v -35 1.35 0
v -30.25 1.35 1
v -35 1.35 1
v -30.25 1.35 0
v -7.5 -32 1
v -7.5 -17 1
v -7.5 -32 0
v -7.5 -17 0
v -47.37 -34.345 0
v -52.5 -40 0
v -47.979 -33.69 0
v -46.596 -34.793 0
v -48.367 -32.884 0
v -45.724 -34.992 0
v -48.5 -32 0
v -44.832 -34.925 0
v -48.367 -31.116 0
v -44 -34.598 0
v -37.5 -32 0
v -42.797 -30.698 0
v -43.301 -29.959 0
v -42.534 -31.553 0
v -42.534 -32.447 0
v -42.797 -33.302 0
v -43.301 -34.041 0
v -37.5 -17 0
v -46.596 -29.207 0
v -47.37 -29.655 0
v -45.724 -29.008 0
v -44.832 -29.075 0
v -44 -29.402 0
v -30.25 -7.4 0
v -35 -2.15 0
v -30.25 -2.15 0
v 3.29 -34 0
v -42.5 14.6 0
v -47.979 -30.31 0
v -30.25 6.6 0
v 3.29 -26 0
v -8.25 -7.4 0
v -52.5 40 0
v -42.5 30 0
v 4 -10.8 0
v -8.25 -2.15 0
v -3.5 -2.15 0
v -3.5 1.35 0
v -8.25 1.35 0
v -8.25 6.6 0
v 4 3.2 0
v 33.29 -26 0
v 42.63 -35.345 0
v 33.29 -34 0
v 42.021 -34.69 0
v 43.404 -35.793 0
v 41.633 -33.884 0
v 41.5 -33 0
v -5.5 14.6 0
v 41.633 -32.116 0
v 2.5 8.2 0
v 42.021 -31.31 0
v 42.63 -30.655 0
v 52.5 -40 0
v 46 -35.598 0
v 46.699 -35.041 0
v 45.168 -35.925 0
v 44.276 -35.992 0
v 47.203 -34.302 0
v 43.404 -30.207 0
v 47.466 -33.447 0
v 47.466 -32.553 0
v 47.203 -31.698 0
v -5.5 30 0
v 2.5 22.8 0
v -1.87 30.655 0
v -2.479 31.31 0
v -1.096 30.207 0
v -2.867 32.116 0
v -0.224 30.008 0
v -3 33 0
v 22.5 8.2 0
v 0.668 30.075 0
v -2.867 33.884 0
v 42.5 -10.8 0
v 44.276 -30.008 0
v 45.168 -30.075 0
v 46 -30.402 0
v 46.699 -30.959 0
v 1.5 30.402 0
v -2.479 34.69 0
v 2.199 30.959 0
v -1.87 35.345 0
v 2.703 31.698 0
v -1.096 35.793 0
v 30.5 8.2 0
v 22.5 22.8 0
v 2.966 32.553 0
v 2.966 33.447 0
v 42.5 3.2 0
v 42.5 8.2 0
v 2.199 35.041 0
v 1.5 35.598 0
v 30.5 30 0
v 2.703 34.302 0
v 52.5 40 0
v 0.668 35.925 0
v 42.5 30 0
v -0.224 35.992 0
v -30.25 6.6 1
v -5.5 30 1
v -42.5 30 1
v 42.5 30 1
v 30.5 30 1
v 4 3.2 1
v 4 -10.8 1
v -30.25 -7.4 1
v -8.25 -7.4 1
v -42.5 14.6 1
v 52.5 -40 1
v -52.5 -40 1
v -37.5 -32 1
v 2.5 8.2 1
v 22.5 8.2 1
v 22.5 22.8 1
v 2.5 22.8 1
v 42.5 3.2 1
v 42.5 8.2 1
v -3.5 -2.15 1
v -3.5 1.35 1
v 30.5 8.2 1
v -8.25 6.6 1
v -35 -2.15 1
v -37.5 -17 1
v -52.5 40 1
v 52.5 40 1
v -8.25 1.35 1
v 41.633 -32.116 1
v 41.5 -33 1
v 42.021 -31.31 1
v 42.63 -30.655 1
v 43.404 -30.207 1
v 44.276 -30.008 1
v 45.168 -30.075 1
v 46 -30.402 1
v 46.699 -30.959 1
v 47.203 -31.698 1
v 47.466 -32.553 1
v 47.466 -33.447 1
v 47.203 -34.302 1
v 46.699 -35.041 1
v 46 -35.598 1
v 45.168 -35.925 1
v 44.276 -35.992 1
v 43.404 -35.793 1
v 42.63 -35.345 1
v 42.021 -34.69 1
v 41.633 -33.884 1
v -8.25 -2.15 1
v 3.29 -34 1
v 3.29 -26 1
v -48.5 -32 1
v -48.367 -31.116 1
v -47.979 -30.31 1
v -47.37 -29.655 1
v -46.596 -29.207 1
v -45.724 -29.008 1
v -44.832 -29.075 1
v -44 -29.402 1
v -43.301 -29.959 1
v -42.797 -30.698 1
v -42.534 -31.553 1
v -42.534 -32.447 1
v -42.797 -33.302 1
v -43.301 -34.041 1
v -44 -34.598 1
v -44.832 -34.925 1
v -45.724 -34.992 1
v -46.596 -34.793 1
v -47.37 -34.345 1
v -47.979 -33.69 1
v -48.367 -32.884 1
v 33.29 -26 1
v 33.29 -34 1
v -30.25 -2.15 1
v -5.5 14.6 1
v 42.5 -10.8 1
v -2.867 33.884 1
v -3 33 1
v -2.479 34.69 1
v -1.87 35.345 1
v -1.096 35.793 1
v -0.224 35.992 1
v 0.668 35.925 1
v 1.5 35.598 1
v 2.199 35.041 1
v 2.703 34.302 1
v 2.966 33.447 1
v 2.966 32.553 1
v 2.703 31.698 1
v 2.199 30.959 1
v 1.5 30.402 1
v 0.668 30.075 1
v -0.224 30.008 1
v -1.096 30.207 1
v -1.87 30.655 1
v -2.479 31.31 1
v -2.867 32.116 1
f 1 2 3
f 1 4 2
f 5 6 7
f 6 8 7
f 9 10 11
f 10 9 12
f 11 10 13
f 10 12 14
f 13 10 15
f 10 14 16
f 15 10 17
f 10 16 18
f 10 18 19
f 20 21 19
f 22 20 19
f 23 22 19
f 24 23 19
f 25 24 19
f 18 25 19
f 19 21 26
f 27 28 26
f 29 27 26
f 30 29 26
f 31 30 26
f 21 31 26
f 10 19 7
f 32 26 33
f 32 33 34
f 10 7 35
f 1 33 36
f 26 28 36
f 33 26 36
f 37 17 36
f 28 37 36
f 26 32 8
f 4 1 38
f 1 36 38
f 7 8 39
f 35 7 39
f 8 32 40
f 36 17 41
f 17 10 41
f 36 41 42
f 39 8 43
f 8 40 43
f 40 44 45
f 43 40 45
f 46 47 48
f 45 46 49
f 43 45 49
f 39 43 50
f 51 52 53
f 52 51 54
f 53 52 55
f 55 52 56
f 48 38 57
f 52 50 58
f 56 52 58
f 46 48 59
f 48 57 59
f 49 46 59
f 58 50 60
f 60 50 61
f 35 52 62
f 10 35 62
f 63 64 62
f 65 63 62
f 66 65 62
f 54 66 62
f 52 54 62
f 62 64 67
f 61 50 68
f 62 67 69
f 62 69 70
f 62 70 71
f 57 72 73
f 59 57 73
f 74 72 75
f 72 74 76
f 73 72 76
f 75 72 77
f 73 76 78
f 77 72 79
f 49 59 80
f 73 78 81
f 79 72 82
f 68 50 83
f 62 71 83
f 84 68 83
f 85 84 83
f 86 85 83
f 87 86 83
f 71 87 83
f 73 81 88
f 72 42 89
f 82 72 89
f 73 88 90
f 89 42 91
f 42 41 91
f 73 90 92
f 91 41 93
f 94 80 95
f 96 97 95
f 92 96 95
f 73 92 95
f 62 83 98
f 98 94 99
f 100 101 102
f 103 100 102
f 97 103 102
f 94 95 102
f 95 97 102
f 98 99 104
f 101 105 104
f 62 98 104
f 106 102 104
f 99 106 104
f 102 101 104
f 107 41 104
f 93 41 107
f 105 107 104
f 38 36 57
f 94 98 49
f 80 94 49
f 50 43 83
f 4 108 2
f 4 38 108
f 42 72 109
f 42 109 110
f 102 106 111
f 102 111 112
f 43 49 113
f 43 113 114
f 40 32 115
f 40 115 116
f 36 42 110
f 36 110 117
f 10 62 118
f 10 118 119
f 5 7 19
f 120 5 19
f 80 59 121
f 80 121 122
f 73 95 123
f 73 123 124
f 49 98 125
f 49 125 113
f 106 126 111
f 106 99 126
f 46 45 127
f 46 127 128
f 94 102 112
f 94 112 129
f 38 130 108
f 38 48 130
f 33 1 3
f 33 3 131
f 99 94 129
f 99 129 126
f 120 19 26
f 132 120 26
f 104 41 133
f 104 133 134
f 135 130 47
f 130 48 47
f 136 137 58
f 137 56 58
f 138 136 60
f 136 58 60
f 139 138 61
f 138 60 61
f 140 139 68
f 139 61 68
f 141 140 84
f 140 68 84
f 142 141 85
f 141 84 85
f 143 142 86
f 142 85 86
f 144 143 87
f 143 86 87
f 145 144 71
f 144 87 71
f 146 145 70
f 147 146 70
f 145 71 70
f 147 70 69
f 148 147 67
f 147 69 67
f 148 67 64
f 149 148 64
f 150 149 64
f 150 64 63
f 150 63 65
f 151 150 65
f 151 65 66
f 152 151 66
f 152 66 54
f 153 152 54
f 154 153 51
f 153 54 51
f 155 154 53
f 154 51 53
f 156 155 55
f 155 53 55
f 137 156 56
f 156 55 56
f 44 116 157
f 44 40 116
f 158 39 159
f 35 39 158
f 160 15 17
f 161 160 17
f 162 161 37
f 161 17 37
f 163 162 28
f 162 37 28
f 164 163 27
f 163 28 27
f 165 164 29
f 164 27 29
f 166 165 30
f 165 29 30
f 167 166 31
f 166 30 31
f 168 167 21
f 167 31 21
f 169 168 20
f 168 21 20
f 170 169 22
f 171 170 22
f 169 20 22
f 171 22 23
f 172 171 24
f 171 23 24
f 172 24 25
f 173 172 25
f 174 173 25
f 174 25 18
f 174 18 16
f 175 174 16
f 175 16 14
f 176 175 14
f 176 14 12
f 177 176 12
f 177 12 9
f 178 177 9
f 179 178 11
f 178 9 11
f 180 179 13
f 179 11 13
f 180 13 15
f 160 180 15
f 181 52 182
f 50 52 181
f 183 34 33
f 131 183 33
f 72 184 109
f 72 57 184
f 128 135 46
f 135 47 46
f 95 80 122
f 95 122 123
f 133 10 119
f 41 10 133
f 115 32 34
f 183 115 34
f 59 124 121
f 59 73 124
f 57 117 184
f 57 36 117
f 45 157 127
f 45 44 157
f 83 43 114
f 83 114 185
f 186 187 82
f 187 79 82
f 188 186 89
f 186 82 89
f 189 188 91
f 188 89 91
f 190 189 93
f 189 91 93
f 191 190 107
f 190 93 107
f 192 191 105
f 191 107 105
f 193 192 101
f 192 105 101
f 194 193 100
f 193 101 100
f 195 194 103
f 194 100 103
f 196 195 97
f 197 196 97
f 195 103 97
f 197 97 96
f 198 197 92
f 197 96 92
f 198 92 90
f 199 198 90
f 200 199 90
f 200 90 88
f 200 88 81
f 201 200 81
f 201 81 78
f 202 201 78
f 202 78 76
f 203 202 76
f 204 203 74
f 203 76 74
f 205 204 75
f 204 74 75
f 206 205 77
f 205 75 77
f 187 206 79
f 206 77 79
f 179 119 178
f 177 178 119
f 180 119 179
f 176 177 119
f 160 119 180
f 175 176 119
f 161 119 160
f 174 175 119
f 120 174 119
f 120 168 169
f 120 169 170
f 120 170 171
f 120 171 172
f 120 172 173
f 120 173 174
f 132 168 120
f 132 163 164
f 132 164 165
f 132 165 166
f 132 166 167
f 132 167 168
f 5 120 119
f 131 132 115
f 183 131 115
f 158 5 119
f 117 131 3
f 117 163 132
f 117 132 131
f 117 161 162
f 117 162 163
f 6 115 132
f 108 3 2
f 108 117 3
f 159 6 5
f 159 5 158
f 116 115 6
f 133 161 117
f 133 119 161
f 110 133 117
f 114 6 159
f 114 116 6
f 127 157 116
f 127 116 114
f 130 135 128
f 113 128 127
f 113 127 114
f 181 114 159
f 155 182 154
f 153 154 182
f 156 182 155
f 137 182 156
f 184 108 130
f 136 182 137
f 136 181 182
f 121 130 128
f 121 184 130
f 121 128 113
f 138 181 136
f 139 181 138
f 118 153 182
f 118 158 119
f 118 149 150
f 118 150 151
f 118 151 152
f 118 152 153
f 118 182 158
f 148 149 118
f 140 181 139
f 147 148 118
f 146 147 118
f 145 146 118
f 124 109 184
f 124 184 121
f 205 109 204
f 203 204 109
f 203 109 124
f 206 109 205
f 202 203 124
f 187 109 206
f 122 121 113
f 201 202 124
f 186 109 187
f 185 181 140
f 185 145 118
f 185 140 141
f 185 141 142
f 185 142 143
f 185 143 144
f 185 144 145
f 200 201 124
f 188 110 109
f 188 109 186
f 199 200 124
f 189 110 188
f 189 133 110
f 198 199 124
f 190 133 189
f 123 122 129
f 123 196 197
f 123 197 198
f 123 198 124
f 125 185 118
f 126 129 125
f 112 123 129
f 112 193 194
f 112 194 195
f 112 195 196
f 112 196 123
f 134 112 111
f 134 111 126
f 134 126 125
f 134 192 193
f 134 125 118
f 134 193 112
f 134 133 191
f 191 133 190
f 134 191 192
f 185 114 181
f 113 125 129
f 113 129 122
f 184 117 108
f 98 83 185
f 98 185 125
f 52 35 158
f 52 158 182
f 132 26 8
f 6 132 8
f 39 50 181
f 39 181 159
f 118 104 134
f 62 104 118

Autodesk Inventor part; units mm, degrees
ref_plane "YZ Plane" through (0, 0, 0) normal (1, 0, 0) x (0, 1, 0)
ref_plane "XZ Plane" through (0, 0, 0) normal (0, 1, 0) x (-1, 0, 0)
ref_plane "XY Plane" through (0, 0, 0) normal (0, 0, 1) x (1, 0, 0)
sketch "Sketch1" plane through (0, 0, 0) normal (0, 0, 1) x (1, 0, 0)
  line L0 (-52.5, 40) -> (52.5, 40)
  line L1 (52.5, 40) -> (52.5, -40)
  line L2 (52.5, -40) -> (-52.5, -40)
  line L3 (-52.5, -40) -> (-52.5, 40)
  line L4 (-52.5, 40) -> (52.5, -40) construction
  line L5 (52.5, 40) -> (-52.5, -40) construction
  point P0 (0, 0)
  dimension "d0" = 80
  dimension "d1" = 105
extrude "Plate1" add sketch "Sketch1" along normal blind 1
sketch "Sketch3" plane through (0, 0, 0) normal (0, 0, -1) x (-1, 0, 0)
  line L0 (-42.5, 3.2) -> (-4, 3.2)
  line L1 (-4, 3.2) -> (-4, -10.8)
  line L2 (-4, -10.8) -> (-42.5, -10.8)
  line L3 (-42.5, -10.8) -> (-42.5, 3.2)
  line L4 (-42.5, 3.2) -> (-4, -10.8) construction
  line L5 (-4, 3.2) -> (-42.5, -10.8) construction
  line L6 (8.25, 6.6) -> (30.25, 6.6)
  line L7 (35, 1.35) -> (35, -2.15)
  line L8 (30.25, -7.4) -> (8.25, -7.4)
  line L9 (3.5, -2.15) -> (3.5, 1.35)
  line L10 (0.2073, 10) -> (38.2927, -10.8) construction
  line L11 (35, 6.6) -> (3.5, -7.4) construction
  line L12 (-2.5, 8.2) -> (-22.5, 8.2)
  line L13 (-22.5, 8.2) -> (-22.5, 22.8)
  line L14 (-22.5, 22.8) -> (-2.5, 22.8)
  line L15 (-2.5, 22.8) -> (-2.5, 8.2)
  line L16 (-2.5, 8.2) -> (-22.5, 22.8) construction
  line L17 (-22.5, 8.2) -> (-2.5, 22.8) construction
  line L18 (-3.29, -34) -> (-33.29, -34)
  line L19 (-33.29, -34) -> (-33.29, -26)
  line L20 (-33.29, -26) -> (-3.29, -26)
  line L21 (-3.29, -26) -> (-3.29, -34)
  line L22 (-3.29, -34) -> (-33.29, -26) construction
  line L23 (-33.29, -34) -> (-3.29, -26) construction
  line L24 (52.5, 40) -> (-52.5, 40) projected
  line L25 (52.5, -40) -> (52.5, 40) projected
  line L26 (30.25, -7.4) -> (30.25, -2.15)
  line L27 (30.25, -2.15) -> (35, -2.15)
  line L28 (30.25, 6.6) -> (30.25, 1.35)
  line L29 (30.25, 1.35) -> (35, 1.35)
  line L30 (8.25, -7.4) -> (8.25, -2.15)
  line L31 (8.25, -2.15) -> (3.5, -2.15)
  line L32 (8.25, 6.6) -> (8.25, 1.35)
  line L33 (8.25, 1.35) -> (3.5, 1.35)
  line L34 (-52.5, 40) -> (-52.5, -40) projected
  line L35 (-42.5, 30) -> (-30.5, 30)
  line L36 (-30.5, 30) -> (-30.5, 8.2)
  line L37 (-30.5, 8.2) -> (-42.5, 8.2)
  line L38 (-42.5, 8.2) -> (-42.5, 30)
  line L39 (7.5, -32) -> (37.5, -32)
  line L40 (37.5, -32) -> (37.5, -17)
  line L41 (37.5, -17) -> (7.5, -17)
  line L42 (7.5, -17) -> (7.5, -32)
  line L43 (-52.5, -40) -> (52.5, -40) projected
  point P0 (0, 0)
  point P1 (-23.25, -3.8)
  point P2 (19.25, -0.4)
  point P3 (-12.5, 15.5)
  point P4 (-18.29, -30)
  dimension "d14" = 14
  dimension "d17" = 7.5
  dimension "d22" = 20
  dimension "d24" = 14.6
  dimension "d37" = 8
  dimension "d40" = 30
  dimension "d46" = 17.2
  dimension "d47" = 55
  dimension "d48" = 17.5
  dimension "d49" = 33.4
  dimension "d50" = 66
  dimension "d65" = 14
  dimension "d66" = 31.5
  dimension "d67" = 3.5
  dimension "d68" = 22
  dimension "d69" = 5
  dimension "d70" = 10
  dimension "d71" = 10
  dimension "d72" = 10
  dimension "d73" = 8
  dimension "d74" = 5
  dimension "d75" = 19.21
  dimension "d76" = 15
  dimension "d77" = 8
  dimension "d78" = 15
  dimension "d79" = 30
extrude "Extrusion1" cut sketch "Sketch3" against normal blind 10 contours L0 L1 L2 L3 | L6 L28 L29 L7 L27 L26 L8 L30 L31 L9 L33 L32 | L12 L13 L14 L15 | L18 L19 L20 L21 | L35 L36 L37 L38 | L42 L41 L40 L39
sketch "Sketch5" plane through (0, 0, 0) normal (0, 0, -1) x (-1, 0, 0)
  line L0 (42.5, 14.6) -> (5.5, 14.6)
  line L1 (5.5, 14.6) -> (5.5, 30)
  line L2 (5.5, 30) -> (42.5, 30)
  line L3 (42.5, 30) -> (42.5, 14.6)
  line L4 (42.5, 14.6) -> (5.5, 30) construction
  line L5 (5.5, 14.6) -> (42.5, 30) construction
  line L6 (8.25, 6.6) -> (30.25, 6.6) projected
  line L7 (-2.5, 22.8) -> (-2.5, 8.2) projected
  line L8 (-4, -10.8) -> (-42.5, -10.8) projected
  line L9 (52.5, 40) -> (-52.5, 40) projected
  line L10 (52.5, -40) -> (52.5, 40) projected
  point P0 (0, 0)
  point P1 (24, 22.3)
  point P2 (3.5, 1.6)
  point P3 (35, 1.6)
  point P4 (24, 14.6)
  dimension "d27" = 8
  dimension "d28" = 8
  dimension "d52" = 10
  dimension "d53" = 10
extrude "Extrusion2" cut sketch "Sketch5" against normal blind 10
sketch "Sketch7" plane through (0, 0, 0) normal (0, 0, -1) x (-1, 0, 0)
  point P0 (0, 0)
sketch "Sketch8" plane through (0, 0, 0) normal (0, 0, -1) x (-1, 0, 0)
  circle A0 centre (45.5, -32) radius 3
  circle A1 centre (-44.5, -33) radius 3
  circle A2 centre (0, 33) radius 3
  line L0 (52.5, -40) -> (52.5, 40) projected
  line L1 (-52.5, -40) -> (52.5, -40) projected
  line L2 (-52.5, 40) -> (-52.5, -40) projected
  line L3 (52.5, 40) -> (-52.5, 40) projected
  point P0 (0, 0)
  dimension "d54" = 6
  dimension "d55" = 6
  dimension "d56" = 6
  dimension "d57" = 7
  dimension "d58" = 8
  dimension "d60" = 8
  dimension "d61" = 7
  dimension "d62" = 7
extrude "Extrusion3" cut sketch "Sketch8" against normal blind 10 contours A0 | A1 | A2
equation "\"d2\" = 厚度"
equation "\"折彎半徑\" = 厚度"
equation "\"最小剩餘\" = 2 * 厚度"
equation "\"轉移半徑\" = 折彎半徑"
equation "\"間隙大小\" = 厚度"
equation "\"折彎離隙寬度\" = 厚度"
equation "\"折彎離隙深度\" = 0.5 * 厚度"
equation "\"轉角離隙大小\" = 4 * 厚度"
equation "\"Jacobi半徑大小\" = 折彎半徑"
equation "\"厚度\" = 1"
properties part number "cap"
